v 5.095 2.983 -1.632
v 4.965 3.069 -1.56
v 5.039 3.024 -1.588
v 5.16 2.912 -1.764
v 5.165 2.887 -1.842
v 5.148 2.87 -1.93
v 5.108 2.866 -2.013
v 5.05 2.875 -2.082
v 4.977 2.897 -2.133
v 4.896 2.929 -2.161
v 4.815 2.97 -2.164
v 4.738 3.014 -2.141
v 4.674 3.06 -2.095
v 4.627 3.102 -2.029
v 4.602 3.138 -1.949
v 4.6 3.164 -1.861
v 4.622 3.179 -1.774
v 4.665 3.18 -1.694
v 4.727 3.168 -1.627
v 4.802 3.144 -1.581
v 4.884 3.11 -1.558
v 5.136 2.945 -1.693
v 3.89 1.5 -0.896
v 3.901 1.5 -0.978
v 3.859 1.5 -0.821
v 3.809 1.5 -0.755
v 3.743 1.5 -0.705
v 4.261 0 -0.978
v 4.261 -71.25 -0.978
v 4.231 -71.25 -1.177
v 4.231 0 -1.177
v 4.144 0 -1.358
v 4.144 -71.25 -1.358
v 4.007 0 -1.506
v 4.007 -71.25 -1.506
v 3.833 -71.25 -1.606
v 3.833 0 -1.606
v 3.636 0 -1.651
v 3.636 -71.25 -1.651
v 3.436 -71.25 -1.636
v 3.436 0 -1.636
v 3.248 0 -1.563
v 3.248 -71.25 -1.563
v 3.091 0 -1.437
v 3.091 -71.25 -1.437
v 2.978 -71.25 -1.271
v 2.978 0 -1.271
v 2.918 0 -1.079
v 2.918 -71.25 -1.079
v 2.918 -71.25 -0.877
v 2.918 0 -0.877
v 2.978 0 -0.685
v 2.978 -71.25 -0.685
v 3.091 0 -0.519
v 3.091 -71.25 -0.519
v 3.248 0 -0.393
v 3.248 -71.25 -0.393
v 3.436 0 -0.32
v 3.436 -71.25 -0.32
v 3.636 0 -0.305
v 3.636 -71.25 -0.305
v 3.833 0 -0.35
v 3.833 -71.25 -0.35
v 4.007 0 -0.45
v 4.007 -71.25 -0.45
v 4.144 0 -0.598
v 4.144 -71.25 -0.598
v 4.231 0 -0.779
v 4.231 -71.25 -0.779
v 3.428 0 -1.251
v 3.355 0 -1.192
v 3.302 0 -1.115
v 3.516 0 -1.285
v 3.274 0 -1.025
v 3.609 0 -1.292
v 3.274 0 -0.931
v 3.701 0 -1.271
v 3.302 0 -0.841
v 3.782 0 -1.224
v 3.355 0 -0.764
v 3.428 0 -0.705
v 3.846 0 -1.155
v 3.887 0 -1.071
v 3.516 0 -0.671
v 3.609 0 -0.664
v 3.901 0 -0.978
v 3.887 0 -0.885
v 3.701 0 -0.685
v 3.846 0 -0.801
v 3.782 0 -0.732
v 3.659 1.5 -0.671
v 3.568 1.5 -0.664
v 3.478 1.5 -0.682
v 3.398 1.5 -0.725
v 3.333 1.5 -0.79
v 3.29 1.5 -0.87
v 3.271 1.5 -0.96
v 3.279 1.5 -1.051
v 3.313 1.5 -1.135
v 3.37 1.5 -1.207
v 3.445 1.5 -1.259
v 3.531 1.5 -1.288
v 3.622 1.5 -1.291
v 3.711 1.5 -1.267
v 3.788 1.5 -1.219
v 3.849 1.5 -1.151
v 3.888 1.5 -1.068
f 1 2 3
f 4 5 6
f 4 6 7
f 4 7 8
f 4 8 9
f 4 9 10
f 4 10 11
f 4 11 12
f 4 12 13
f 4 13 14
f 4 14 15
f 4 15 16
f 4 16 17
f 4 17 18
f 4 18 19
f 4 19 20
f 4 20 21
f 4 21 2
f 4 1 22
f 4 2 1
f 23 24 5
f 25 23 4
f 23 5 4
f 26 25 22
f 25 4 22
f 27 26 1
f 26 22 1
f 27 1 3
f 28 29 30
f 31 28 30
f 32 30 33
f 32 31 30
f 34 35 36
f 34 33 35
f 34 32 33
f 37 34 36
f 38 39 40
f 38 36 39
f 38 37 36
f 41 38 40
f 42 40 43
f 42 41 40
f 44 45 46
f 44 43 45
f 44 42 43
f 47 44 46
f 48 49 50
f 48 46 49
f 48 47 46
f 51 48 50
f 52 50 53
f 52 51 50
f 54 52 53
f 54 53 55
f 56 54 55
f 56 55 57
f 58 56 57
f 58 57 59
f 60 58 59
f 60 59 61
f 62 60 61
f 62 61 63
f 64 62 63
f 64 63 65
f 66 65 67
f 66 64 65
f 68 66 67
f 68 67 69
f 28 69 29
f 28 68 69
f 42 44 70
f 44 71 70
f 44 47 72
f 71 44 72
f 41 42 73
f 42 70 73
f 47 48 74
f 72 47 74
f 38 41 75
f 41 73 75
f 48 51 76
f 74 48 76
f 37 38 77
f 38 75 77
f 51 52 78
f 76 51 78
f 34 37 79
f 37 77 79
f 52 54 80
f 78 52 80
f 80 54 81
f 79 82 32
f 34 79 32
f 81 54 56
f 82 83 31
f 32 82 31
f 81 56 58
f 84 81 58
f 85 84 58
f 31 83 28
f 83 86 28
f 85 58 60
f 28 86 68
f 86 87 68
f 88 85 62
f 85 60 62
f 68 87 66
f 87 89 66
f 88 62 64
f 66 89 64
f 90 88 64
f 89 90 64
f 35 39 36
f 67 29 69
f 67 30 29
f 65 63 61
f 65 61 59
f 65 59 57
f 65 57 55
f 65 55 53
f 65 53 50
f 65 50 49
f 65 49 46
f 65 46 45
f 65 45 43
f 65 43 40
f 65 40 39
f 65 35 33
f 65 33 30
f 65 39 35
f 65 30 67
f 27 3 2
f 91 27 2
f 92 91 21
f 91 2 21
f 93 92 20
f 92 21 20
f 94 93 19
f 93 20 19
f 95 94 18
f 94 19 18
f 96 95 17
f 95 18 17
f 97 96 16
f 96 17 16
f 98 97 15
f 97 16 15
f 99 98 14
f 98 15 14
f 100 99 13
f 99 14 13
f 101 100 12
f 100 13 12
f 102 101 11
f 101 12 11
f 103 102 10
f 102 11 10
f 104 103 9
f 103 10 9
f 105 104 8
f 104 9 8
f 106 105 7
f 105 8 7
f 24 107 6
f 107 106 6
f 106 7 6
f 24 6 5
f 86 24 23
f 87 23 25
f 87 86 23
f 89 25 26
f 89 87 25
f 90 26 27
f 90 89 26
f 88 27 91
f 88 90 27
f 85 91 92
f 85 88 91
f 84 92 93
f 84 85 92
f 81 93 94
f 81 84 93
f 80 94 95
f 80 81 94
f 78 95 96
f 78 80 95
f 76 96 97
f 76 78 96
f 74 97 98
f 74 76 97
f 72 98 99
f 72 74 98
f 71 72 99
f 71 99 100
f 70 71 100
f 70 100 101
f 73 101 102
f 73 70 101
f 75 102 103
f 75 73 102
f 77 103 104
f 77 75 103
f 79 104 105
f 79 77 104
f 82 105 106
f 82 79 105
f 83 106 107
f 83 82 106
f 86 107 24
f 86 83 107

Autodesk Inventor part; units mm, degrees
ref_plane "YZ Plane" through (0, 0, 0) normal (1, 0, 0) x (0, 1, 0)
ref_plane "XZ Plane" through (0, 0, 0) normal (0, 1, 0) x (-1, 0, 0)
ref_plane "XY Plane" through (0, 0, 0) normal (0, 0, 1) x (1, 0, 0)
ref_plane "Work Plane2" through (3.5859, 0, -0.978) normal (0, -1, 0) x (1, 0, 0)
sketch "Sketch2" plane through (3.5859, 0, -0.978) normal (0, -1, 0) x (1, 0, 0)
  circle A0 centre (0, 0) radius 0.675
  point P0 (-3.5859, 0.978)
  dimension "d3" = 1.35
extrude "Extrusion2" add sketch "Sketch2" along normal blind 71.25
ref_plane "Work Plane1" through (3.5859, 3, -0.978) normal (0, 1, 0) x (1, 0, 0)
sketch "Sketch3" plane through (3.5859, 0, -0.978) normal (0, 1, 0) x (1, 0, 0)
  circle A0 centre (0, 0) radius 0.315
  point P0 (-3.5859, -0.978)
  dimension "d7" = 0.63
extrude "Extrusion3" add sketch "Sketch3" along normal blind 1.5
ref_plane "Work Plane3" through (5.9115, 2.4915, -1.92) normal (0.4330127, 0.8660254, -0.25) x (0.5, 0, 0.8660254)
sketch "Sketch5" plane through (5.9115, 2.4915, -1.92) normal (0.4330127, 0.8660254, -0.25) x (0.5, 0, 0.8660254)
  circle A0 centre (-0.4635, -1.064) radius 0.315
  point P0 (-1.293, -4.0192)
  dimension "d11" = 0.63
loft "Loft1" add profiles "Sketch5" section 1 edges at (3.2709, 1.5, -0.978)
properties part number "redWire"
